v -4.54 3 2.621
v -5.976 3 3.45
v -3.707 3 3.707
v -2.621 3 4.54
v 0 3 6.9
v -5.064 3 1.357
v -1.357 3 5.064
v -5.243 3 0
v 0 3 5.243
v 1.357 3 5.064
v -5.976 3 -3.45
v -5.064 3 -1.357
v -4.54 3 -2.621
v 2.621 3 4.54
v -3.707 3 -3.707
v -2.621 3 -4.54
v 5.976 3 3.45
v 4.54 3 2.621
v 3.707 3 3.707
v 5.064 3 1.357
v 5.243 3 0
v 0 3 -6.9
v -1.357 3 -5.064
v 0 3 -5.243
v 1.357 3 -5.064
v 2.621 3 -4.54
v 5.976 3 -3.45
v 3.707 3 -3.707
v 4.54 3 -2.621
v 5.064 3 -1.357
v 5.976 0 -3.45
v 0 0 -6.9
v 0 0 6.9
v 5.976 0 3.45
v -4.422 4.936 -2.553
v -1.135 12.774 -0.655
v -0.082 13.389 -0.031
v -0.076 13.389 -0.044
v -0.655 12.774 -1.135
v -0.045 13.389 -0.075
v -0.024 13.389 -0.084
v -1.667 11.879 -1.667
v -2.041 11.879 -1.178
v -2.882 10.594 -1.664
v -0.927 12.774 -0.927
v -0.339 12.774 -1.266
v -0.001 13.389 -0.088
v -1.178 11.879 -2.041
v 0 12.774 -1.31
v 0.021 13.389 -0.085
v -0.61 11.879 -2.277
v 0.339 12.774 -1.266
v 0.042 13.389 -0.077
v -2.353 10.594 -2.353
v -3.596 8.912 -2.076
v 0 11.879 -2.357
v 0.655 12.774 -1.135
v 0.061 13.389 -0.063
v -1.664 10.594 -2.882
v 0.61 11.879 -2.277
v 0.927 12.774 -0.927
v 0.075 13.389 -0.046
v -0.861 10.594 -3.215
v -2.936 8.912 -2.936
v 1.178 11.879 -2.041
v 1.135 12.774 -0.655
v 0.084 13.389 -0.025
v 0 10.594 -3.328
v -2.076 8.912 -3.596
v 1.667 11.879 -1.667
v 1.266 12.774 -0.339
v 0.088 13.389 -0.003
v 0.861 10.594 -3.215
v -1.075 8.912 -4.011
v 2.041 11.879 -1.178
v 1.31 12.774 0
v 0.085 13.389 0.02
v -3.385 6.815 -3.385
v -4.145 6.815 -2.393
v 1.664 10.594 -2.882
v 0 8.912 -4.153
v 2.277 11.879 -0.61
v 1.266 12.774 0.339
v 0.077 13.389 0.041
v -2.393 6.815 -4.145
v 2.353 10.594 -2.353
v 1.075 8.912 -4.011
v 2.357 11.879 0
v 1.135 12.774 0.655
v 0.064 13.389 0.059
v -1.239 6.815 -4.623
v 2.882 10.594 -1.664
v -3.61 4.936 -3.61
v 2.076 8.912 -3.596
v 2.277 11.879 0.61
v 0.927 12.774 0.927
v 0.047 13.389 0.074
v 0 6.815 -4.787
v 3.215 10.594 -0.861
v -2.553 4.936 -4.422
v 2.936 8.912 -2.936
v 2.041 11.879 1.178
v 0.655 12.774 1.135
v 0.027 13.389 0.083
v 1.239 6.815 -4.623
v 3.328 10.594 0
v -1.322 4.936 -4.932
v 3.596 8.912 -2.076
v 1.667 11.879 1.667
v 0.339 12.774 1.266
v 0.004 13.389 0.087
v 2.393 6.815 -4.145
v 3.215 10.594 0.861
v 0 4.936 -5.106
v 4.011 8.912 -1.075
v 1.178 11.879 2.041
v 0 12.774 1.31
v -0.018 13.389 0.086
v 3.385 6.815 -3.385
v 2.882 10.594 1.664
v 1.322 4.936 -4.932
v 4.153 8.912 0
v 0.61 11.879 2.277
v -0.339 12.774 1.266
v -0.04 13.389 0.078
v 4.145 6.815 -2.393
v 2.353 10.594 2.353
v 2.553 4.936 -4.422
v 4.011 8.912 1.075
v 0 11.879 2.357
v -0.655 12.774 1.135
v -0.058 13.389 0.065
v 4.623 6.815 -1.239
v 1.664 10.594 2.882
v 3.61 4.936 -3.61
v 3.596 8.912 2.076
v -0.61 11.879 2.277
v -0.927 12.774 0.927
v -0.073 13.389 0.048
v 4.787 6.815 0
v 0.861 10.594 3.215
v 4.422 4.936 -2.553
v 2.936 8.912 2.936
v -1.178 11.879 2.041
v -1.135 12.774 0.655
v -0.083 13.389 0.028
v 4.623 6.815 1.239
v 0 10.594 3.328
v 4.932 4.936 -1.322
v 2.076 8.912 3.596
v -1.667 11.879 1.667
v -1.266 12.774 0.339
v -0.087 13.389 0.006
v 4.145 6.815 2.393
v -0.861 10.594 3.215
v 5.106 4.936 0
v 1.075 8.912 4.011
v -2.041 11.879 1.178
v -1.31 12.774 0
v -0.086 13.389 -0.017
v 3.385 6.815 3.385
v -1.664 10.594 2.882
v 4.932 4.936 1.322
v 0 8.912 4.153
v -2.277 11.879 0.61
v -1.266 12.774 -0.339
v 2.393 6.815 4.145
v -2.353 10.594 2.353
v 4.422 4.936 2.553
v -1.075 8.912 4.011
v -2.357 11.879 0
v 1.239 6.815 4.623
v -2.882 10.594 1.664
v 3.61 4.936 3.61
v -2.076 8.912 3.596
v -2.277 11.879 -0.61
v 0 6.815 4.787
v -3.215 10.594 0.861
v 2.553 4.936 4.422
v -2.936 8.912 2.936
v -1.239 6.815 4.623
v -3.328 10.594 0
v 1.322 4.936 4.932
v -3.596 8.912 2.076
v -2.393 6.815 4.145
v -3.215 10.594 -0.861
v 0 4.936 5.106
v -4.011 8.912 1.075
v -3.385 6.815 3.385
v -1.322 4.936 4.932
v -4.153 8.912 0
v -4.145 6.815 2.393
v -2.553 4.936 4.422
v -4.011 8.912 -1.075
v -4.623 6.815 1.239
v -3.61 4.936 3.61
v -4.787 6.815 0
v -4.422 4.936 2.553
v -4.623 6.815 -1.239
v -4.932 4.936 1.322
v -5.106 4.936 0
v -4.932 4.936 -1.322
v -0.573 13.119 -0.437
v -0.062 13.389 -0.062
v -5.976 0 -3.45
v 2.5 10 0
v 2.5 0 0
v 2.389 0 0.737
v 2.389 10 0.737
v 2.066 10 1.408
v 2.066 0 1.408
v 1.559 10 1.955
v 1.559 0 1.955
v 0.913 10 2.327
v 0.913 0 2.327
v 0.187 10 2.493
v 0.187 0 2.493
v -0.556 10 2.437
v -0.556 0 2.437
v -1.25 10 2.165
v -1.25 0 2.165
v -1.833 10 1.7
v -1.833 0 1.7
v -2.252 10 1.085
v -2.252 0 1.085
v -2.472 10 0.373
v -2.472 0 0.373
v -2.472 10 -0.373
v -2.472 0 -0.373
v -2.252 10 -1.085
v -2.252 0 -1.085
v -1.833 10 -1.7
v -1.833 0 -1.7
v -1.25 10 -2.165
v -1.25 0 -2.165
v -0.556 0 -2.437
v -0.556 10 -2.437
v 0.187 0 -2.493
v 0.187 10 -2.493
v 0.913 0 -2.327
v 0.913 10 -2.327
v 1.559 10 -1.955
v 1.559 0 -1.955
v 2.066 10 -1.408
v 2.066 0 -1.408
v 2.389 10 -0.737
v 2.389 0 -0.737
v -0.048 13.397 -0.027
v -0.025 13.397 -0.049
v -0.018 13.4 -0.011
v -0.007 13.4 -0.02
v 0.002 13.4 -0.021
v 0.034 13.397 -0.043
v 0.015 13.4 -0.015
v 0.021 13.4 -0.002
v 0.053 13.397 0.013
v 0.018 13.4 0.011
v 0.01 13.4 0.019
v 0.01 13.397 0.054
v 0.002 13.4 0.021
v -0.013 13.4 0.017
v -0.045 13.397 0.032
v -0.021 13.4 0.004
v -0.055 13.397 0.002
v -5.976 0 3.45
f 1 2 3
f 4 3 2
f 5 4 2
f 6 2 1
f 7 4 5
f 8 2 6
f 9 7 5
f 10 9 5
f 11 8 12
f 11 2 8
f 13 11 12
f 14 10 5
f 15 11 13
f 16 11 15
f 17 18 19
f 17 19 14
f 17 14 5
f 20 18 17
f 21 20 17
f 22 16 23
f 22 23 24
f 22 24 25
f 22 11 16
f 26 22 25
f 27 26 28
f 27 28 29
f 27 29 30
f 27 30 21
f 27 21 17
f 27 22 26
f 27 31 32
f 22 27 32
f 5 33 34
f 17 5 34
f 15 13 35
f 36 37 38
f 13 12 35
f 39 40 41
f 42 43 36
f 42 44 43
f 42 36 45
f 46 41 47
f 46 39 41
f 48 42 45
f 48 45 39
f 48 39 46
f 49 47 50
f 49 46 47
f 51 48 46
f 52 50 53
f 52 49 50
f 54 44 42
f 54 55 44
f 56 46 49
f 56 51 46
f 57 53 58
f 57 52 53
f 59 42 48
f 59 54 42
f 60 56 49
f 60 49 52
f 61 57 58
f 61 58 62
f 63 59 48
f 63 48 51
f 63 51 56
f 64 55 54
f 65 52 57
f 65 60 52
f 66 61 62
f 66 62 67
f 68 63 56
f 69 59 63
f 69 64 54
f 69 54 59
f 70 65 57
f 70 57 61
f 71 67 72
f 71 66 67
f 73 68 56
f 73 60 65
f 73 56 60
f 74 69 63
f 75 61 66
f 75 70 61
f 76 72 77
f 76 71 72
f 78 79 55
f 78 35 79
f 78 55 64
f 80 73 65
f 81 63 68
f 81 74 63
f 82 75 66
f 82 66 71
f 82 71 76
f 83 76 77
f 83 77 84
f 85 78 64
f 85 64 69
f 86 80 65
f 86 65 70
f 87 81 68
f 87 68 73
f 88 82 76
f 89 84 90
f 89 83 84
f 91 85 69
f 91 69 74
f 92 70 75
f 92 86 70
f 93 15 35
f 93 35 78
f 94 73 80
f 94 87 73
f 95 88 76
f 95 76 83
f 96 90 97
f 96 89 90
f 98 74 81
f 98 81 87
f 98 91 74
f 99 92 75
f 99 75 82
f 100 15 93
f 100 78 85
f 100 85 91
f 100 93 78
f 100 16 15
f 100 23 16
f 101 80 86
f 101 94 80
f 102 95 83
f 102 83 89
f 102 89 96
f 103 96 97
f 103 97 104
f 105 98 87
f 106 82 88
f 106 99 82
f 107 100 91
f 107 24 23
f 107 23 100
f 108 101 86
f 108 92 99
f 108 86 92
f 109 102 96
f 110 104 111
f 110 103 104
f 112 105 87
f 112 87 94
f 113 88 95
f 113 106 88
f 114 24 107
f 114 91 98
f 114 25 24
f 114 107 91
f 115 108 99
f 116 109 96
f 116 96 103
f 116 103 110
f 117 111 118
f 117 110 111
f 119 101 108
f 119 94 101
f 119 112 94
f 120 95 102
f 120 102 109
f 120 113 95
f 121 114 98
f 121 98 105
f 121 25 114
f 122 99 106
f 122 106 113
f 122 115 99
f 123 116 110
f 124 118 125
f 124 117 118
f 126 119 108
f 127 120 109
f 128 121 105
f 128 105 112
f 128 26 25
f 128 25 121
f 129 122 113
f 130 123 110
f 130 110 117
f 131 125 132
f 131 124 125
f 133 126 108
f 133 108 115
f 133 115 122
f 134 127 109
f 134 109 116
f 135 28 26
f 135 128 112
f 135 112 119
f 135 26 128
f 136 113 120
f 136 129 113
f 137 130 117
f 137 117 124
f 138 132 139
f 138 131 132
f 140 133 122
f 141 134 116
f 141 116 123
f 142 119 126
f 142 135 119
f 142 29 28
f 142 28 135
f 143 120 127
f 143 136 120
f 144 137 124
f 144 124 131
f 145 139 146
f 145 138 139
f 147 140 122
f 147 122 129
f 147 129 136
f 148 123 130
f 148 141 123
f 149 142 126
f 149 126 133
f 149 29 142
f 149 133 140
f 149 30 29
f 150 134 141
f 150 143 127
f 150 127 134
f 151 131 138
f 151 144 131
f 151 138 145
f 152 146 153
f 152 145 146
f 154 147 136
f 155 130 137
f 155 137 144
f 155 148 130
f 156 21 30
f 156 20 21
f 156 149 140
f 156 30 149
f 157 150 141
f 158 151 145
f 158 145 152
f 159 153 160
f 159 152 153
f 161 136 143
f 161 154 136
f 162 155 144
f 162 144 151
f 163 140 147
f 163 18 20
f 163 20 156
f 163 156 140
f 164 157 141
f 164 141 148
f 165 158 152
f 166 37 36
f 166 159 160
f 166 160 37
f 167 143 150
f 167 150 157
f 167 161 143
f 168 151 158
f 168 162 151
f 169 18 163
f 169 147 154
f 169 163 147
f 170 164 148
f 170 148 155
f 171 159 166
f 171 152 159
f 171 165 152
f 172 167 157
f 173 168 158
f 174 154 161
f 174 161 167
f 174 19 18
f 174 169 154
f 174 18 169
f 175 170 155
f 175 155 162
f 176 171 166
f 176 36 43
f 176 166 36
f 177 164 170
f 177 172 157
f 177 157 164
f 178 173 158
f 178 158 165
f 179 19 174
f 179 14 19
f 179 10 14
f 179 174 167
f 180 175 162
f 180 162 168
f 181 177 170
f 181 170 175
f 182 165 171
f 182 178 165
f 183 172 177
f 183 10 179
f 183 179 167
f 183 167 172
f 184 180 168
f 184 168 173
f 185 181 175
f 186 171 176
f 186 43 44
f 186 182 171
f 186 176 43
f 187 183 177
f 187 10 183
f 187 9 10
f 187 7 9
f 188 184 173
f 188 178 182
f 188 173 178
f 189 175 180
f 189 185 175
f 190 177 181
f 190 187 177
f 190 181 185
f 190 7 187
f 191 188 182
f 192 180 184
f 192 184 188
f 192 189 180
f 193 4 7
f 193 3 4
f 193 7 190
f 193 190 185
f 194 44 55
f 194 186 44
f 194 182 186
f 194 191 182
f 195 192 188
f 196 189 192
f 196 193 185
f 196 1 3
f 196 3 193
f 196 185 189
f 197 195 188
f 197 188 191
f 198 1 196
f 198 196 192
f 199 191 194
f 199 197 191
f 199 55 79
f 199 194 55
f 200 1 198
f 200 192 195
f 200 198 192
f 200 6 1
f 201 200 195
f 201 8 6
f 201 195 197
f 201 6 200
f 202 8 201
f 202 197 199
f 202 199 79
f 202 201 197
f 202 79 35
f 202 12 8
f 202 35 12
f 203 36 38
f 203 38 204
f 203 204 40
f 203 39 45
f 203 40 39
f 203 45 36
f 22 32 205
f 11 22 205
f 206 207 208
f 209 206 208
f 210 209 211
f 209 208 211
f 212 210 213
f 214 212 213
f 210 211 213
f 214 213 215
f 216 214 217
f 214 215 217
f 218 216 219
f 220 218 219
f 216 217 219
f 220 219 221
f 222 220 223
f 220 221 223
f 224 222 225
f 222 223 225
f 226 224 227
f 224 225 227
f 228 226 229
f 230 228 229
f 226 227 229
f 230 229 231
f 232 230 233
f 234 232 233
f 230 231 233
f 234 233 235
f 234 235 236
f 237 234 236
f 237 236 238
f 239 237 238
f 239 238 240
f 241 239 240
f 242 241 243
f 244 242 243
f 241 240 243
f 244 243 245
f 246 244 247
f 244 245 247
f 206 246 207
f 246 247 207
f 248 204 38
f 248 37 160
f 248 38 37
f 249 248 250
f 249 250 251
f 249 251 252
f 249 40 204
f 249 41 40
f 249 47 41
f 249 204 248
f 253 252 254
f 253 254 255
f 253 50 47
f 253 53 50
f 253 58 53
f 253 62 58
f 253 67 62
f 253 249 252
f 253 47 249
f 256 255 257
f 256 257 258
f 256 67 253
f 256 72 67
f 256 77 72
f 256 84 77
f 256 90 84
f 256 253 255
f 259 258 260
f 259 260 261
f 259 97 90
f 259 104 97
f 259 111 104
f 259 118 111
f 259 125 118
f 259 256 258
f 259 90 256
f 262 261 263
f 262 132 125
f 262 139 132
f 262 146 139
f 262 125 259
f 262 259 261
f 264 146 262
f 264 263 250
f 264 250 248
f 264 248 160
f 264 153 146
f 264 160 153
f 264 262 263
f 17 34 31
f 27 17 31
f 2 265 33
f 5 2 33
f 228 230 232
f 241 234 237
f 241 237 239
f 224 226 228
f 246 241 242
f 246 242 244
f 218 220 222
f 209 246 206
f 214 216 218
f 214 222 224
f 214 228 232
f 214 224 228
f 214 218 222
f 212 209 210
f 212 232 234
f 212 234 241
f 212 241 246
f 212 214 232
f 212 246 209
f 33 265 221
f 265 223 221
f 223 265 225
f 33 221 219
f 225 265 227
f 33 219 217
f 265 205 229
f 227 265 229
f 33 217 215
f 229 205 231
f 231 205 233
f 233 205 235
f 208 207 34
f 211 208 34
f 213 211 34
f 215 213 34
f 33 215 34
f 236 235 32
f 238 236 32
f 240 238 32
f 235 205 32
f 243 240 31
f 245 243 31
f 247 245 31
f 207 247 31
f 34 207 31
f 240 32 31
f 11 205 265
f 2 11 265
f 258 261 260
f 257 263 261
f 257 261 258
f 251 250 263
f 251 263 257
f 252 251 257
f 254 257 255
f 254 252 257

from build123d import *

# Parameters (mm, degrees)
SALIENTE_EXTRUIR1_DEPTH = 3
CROQUIS2_R              = 5.5
SALIENTE_EXTRUIR2_DEPTH = 10.4
REDONDEO3_R             = 0.2
CROQUIS4_R              = 2.5
CORTAR_EXTRUIR1_DEPTH   = 10


with BuildPart() as part:
    # Croquis1 → Saliente-Extruir1 (new body)
    with BuildSketch(Plane(origin=(0, 0, 0), x_dir=(1, 0, 0), z_dir=(0, 1, 0))):
        Polygon((0, -6.9), (5.975575286, -3.45), (5.975575286, 3.45), (0, 6.9), (-5.975575286, 3.45), (-5.975575286, -3.45), align=None)
    extrude(amount=SALIENTE_EXTRUIR1_DEPTH)

    # Croquis2 → Saliente-Extruir2 (add)
    with BuildSketch(Plane(origin=(0, 3, 0), x_dir=(1, 0, 0), z_dir=(0, 1, 0))):
        Circle(CROQUIS2_R)
    extrude(amount=SALIENTE_EXTRUIR2_DEPTH)

    # Croquis3 → Cortar-Revolución17 (revolve, cut)
    with BuildSketch(Plane(origin=(0, 0, 0), x_dir=(0.8660254037844386, 0, 0.5000000000000001), z_dir=(-0.5000000000000001, 0, 0.8660254037844386))):
        with BuildLine():
            Line((-0.05505313, 13.4), (-9.065705725, 13.4))
            Line((-9.065705725, 13.4), (-9.065705725, 3))
            Line((-9.065705725, 3), (-5.242775997, 3))
            add(Edge.make_bspline(
                [(-0.05505313, 13.4), (-3.55300642, 12.195542183), (-5.129402013, 7.591757737), (-5.242775997, 3)],
                knots=[0.003430867, 0.003430867, 0.003430867, 0.003430867, 0.878426724, 0.878426724, 0.878426724, 0.878426724], degree=3))
        make_face()
    revolve(axis=Axis((0, 16.4, 0), (0, -1, 0)), mode=Mode.SUBTRACT)

    # Redondeo3
    redondeo3_edges = [part.edges().sort_by_distance(p)[0] for p in [
        (0.04767741, 13.4, 0.027526565),
    ]]
    fillet(redondeo3_edges, radius=REDONDEO3_R)

    # Croquis4 → Cortar-Extruir1 (cut)
    with BuildSketch(Plane.XZ):
        Circle(CROQUIS4_R)
    extrude(amount=-CORTAR_EXTRUIR1_DEPTH, mode=Mode.SUBTRACT)


solid = part.part
